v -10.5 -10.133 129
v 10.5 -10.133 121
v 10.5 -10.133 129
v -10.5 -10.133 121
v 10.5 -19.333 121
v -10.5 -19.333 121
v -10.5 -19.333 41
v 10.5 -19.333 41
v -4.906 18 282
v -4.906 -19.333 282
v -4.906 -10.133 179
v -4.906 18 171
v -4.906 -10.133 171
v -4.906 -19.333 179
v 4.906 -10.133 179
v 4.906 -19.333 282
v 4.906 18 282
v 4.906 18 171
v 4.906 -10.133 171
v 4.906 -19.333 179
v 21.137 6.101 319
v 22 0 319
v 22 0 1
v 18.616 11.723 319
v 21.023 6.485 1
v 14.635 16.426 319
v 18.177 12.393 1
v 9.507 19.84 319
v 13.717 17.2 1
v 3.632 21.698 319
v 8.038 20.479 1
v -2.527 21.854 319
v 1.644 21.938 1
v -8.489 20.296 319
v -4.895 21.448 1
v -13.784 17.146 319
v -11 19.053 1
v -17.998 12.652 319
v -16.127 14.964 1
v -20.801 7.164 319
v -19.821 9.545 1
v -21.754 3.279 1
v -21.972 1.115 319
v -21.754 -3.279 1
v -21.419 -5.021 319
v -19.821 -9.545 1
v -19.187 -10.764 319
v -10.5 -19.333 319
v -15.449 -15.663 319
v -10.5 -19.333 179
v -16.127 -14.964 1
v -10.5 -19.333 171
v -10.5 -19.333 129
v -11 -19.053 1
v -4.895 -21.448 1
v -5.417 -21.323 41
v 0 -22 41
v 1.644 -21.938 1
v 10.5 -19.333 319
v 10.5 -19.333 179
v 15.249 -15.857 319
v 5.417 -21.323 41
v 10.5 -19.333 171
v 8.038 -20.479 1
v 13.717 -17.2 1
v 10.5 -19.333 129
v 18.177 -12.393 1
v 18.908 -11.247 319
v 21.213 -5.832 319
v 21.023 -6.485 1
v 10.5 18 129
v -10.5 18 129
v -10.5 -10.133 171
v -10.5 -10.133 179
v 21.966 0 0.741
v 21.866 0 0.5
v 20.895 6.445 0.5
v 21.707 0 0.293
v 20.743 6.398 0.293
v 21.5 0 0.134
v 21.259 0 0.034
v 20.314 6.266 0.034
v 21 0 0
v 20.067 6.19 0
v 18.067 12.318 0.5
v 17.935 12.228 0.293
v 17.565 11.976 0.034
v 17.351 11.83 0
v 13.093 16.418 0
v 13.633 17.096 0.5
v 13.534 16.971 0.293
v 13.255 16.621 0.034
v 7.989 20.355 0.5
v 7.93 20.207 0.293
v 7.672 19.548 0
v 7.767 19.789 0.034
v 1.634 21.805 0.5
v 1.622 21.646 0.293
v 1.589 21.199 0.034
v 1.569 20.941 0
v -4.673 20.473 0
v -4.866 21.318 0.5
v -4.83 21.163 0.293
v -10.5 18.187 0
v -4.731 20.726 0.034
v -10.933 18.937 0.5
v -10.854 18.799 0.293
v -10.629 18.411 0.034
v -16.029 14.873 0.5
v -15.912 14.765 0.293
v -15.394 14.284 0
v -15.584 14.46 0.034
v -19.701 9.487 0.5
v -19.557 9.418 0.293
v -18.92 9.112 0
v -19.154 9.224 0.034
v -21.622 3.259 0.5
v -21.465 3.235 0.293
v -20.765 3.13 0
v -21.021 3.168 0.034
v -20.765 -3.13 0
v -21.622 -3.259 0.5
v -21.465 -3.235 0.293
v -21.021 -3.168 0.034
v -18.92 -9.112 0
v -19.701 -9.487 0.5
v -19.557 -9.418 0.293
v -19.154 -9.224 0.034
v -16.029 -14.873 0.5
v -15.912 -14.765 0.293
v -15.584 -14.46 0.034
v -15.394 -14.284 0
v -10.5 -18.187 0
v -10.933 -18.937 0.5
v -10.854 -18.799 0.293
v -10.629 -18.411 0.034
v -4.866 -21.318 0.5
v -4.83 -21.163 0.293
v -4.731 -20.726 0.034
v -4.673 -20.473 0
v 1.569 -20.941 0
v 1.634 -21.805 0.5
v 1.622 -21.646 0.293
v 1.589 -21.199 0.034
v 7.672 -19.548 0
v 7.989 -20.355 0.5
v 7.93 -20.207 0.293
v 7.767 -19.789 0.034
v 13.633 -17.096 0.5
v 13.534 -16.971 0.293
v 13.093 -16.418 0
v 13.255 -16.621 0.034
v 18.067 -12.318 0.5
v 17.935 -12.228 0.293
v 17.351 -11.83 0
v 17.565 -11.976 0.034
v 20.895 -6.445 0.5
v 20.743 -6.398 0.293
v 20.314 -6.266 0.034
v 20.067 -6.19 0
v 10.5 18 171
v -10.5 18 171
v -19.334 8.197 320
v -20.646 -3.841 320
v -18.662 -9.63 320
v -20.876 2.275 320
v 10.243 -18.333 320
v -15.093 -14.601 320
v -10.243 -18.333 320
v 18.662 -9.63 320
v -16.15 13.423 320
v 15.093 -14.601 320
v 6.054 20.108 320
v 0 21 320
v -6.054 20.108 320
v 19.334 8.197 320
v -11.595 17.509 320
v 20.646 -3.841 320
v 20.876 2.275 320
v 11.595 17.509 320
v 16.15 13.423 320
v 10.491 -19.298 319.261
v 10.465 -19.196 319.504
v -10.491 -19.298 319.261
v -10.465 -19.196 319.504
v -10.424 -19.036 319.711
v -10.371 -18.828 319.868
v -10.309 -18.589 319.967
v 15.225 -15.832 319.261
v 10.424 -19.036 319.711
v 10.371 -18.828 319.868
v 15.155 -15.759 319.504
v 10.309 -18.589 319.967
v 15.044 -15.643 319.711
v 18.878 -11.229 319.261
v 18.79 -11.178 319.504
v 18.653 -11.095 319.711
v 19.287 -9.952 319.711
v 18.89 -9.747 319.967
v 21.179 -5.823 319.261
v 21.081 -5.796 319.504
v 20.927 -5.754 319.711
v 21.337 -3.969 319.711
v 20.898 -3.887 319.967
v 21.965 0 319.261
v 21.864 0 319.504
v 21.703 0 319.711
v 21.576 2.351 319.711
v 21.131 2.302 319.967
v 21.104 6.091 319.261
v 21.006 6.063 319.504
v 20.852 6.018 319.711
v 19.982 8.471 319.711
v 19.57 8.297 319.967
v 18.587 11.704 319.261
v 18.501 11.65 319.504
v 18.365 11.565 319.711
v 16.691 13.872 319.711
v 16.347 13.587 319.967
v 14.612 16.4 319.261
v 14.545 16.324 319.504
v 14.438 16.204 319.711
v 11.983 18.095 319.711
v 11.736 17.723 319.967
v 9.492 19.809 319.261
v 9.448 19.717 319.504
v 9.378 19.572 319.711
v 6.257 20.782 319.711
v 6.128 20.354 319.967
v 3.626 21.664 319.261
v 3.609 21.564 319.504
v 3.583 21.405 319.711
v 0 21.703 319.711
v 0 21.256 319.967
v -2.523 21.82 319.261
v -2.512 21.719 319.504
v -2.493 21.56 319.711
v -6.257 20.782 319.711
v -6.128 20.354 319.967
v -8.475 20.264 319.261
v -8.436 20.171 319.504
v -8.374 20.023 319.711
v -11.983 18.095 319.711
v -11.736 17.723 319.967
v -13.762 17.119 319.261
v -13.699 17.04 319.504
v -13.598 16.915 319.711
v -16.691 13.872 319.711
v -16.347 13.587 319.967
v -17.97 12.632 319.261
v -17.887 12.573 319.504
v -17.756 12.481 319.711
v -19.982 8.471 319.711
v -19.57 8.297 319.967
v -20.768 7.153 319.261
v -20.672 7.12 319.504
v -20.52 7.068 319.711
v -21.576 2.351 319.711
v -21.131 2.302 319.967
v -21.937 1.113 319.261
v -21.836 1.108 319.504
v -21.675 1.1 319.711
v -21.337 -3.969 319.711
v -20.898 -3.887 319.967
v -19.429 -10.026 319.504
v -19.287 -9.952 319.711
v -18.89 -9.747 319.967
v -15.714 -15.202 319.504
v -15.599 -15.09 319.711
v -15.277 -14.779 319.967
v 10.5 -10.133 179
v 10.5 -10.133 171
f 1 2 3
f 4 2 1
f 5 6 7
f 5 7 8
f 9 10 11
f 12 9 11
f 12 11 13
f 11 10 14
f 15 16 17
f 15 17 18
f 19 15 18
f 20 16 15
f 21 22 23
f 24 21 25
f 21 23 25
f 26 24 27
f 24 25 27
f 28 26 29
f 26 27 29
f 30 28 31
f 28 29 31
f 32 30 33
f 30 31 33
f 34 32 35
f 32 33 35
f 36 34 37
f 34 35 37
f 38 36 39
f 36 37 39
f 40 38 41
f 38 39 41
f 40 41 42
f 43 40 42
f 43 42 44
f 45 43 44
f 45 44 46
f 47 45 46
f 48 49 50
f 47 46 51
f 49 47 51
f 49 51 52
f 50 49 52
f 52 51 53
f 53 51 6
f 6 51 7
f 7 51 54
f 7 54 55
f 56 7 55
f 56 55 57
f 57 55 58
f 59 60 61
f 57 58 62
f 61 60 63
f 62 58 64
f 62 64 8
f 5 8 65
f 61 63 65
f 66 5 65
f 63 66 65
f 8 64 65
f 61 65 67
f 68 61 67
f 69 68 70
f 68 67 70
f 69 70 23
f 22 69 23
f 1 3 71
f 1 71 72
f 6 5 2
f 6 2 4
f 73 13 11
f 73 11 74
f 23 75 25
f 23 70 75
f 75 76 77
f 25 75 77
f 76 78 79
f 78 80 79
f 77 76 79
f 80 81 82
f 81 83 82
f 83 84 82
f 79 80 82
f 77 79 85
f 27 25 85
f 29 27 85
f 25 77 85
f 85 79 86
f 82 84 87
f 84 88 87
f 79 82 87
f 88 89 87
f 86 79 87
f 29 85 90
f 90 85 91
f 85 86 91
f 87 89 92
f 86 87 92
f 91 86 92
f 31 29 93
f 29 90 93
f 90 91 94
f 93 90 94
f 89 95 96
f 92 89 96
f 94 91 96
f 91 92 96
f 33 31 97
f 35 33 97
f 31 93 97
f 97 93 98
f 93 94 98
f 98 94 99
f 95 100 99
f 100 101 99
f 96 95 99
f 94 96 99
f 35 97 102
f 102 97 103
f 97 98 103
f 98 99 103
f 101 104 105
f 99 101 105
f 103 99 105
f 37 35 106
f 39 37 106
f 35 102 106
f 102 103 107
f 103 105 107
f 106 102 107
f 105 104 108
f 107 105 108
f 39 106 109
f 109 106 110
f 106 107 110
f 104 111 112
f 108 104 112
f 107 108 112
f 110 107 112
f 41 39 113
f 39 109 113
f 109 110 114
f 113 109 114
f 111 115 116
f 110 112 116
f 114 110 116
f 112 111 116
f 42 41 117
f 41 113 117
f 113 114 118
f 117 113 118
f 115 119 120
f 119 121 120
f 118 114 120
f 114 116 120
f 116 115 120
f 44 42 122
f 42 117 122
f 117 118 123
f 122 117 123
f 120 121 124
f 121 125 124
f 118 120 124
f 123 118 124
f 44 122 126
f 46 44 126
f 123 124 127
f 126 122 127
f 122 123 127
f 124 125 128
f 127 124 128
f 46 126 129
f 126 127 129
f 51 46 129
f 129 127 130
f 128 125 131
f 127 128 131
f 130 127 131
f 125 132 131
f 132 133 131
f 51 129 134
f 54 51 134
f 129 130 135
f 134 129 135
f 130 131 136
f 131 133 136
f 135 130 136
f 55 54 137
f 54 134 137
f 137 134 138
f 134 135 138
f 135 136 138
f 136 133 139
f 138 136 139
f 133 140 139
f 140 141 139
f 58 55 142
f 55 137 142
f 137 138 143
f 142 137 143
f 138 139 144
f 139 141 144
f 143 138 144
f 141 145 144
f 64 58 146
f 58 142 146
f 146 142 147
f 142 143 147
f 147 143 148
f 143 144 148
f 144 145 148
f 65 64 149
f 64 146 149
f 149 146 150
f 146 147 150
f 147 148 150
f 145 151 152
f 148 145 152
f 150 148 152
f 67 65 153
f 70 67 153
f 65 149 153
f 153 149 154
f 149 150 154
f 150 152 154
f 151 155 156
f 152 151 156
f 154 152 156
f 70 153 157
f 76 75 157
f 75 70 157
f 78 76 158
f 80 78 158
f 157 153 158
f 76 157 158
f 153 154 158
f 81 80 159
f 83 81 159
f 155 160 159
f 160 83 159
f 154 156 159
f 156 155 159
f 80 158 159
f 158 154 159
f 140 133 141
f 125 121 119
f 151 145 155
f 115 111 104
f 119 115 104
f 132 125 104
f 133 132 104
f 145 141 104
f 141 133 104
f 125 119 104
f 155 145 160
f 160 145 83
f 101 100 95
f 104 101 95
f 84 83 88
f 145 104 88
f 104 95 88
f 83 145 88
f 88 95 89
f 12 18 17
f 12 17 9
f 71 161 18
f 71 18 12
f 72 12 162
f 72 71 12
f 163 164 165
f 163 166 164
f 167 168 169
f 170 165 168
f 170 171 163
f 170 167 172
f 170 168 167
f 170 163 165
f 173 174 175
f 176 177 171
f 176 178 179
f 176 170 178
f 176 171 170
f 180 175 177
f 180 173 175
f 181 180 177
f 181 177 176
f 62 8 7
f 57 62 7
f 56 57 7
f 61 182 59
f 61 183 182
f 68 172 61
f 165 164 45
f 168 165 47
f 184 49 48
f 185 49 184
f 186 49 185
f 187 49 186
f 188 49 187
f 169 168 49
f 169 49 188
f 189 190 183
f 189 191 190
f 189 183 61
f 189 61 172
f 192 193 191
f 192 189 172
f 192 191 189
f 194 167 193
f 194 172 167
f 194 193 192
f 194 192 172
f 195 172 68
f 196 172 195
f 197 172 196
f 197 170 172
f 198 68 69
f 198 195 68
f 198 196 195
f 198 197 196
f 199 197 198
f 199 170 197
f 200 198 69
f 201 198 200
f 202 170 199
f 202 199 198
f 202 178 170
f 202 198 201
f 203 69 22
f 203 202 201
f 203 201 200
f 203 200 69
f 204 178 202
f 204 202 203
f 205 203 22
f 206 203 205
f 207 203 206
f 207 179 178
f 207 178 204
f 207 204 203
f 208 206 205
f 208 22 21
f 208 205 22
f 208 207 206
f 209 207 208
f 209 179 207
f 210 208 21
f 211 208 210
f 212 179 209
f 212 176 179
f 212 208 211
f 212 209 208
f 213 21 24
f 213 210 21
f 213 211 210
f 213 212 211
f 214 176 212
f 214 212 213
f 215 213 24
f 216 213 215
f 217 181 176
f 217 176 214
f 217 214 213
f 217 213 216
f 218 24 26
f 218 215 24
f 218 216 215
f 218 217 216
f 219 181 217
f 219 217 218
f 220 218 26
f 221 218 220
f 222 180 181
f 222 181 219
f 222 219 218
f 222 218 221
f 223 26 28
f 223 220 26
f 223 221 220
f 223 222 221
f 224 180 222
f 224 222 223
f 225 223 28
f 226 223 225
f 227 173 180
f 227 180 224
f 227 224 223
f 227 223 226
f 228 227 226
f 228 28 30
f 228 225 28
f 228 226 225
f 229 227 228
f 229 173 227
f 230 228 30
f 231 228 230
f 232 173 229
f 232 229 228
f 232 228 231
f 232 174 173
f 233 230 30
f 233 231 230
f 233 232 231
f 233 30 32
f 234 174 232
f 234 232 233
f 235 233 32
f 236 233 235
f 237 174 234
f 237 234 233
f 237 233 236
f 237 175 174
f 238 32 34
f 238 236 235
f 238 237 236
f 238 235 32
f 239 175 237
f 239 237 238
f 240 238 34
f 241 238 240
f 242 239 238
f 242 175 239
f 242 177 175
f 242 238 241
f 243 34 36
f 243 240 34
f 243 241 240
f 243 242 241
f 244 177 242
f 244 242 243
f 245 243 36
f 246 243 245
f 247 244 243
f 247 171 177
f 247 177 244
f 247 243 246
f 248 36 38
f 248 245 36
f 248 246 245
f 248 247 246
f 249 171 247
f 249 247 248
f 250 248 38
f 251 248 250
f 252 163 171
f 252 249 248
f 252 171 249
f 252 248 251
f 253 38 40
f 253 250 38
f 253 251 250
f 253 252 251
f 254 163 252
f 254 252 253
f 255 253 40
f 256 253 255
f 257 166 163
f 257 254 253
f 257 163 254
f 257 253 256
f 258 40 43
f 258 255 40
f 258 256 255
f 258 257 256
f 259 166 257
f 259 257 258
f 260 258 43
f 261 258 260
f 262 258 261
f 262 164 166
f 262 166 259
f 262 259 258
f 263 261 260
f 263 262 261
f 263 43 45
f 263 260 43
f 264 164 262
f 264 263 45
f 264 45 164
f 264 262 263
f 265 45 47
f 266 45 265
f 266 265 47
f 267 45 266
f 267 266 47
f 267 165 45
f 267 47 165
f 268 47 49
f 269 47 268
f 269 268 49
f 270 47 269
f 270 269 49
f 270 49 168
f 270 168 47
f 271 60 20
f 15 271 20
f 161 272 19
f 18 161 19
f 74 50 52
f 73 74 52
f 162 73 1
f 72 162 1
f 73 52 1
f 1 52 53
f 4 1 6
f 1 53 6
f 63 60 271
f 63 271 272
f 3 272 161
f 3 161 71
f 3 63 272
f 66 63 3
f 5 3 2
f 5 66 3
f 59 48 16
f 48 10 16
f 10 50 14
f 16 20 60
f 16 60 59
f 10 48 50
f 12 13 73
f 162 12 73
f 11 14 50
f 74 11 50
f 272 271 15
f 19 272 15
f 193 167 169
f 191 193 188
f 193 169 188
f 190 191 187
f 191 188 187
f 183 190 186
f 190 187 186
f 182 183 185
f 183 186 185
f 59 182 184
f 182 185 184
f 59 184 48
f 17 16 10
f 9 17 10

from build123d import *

# Parameters (mm, degrees)
SKETCH_1_R               = 22
EXTRUDE_1_DEPTH          = 320
SKETCH_3_W               = 21
SKETCH_3_H               = 42
CUT_EXTRUDE_1_DEPTH      = 40
CUT_EXTRUDE_2_DEPTH      = 130
CUT_EXTRUDE_2_DEPTH_BACK = 150
SKETCH_8_W               = 21
SKETCH_8_H               = 8
CUT_EXTRUDE_5_DEPTH      = 9.2
SKETCH_9_W               = 9.811196784
SKETCH_9_H               = 111
CUT_EXTRUDE_6_DEPTH      = 37.332615
FILLET_1_R               = 1
FILLET_2_R               = 1


with BuildPart() as part:
    # Sketch 1 → Extrude 1 (new body)
    with BuildSketch(Plane.XY):
        Circle(SKETCH_1_R)
    extrude(amount=EXTRUDE_1_DEPTH)

    # Sketch 3 → Cut-Extrude 1 (cut)
    with BuildSketch(Plane(origin=(0, -22, 0), x_dir=(-1, 0, 0), z_dir=(0, -1, 0))):
        with Locations((0, -150)):
            Rectangle(SKETCH_3_W, SKETCH_3_H)
    extrude(amount=-CUT_EXTRUDE_1_DEPTH, mode=Mode.SUBTRACT)

    # Sketch 5 → Cut-Extrude 2 (cut, two sides)
    with BuildSketch(Plane(origin=(0, 0, 171), x_dir=(-1, 0, 0), z_dir=(0, 0, -1))) as cut_extrude_2_sk:
        with BuildLine():
            Line((10.5, -19.332614929), (-10.5, -19.332614929))
            ThreePointArc((-10.5, -19.332614929), (0, -22), (10.5, -19.332614929))
        make_face()
    extrude(amount=CUT_EXTRUDE_2_DEPTH, mode=Mode.SUBTRACT)
    extrude(cut_extrude_2_sk.sketch, amount=-CUT_EXTRUDE_2_DEPTH_BACK, mode=Mode.SUBTRACT)

    # Sketch 8 → Cut-Extrude 5 (cut)
    with BuildSketch(Plane(origin=(0, -19.332614929, 0), x_dir=(-1, 0, 0), z_dir=(0, -1, 0))):
        with Locations((0, -175)):
            Rectangle(SKETCH_8_W, SKETCH_8_H)
        with Locations((0, -125)):
            Rectangle(SKETCH_8_W, SKETCH_8_H)
    extrude(amount=-CUT_EXTRUDE_5_DEPTH, mode=Mode.SUBTRACT)

    # Sketch 9 → Cut-Extrude 6 (cut)
    with BuildSketch(Plane(origin=(0, -19.332614929, 0), x_dir=(-1, 0, 0), z_dir=(0, -1, 0))):
        with Locations((0, -226.5)):
            Rectangle(SKETCH_9_W, SKETCH_9_H)
    extrude(amount=-CUT_EXTRUDE_6_DEPTH, mode=Mode.SUBTRACT)

    # Fillet 1
    fillet_1_edges = [part.edges().sort_by_distance(p)[0] for p in [
        (-22, 0, 0),
    ]]
    fillet(fillet_1_edges, radius=FILLET_1_R)

    # Fillet 2
    fillet_2_edges = [part.edges().sort_by_distance(p)[0] for p in [
        (-11.247221879, 18.907670401, 320),
        (0, -19.332614929, 320),
    ]]
    fillet(fillet_2_edges, radius=FILLET_2_R)


solid = part.part
